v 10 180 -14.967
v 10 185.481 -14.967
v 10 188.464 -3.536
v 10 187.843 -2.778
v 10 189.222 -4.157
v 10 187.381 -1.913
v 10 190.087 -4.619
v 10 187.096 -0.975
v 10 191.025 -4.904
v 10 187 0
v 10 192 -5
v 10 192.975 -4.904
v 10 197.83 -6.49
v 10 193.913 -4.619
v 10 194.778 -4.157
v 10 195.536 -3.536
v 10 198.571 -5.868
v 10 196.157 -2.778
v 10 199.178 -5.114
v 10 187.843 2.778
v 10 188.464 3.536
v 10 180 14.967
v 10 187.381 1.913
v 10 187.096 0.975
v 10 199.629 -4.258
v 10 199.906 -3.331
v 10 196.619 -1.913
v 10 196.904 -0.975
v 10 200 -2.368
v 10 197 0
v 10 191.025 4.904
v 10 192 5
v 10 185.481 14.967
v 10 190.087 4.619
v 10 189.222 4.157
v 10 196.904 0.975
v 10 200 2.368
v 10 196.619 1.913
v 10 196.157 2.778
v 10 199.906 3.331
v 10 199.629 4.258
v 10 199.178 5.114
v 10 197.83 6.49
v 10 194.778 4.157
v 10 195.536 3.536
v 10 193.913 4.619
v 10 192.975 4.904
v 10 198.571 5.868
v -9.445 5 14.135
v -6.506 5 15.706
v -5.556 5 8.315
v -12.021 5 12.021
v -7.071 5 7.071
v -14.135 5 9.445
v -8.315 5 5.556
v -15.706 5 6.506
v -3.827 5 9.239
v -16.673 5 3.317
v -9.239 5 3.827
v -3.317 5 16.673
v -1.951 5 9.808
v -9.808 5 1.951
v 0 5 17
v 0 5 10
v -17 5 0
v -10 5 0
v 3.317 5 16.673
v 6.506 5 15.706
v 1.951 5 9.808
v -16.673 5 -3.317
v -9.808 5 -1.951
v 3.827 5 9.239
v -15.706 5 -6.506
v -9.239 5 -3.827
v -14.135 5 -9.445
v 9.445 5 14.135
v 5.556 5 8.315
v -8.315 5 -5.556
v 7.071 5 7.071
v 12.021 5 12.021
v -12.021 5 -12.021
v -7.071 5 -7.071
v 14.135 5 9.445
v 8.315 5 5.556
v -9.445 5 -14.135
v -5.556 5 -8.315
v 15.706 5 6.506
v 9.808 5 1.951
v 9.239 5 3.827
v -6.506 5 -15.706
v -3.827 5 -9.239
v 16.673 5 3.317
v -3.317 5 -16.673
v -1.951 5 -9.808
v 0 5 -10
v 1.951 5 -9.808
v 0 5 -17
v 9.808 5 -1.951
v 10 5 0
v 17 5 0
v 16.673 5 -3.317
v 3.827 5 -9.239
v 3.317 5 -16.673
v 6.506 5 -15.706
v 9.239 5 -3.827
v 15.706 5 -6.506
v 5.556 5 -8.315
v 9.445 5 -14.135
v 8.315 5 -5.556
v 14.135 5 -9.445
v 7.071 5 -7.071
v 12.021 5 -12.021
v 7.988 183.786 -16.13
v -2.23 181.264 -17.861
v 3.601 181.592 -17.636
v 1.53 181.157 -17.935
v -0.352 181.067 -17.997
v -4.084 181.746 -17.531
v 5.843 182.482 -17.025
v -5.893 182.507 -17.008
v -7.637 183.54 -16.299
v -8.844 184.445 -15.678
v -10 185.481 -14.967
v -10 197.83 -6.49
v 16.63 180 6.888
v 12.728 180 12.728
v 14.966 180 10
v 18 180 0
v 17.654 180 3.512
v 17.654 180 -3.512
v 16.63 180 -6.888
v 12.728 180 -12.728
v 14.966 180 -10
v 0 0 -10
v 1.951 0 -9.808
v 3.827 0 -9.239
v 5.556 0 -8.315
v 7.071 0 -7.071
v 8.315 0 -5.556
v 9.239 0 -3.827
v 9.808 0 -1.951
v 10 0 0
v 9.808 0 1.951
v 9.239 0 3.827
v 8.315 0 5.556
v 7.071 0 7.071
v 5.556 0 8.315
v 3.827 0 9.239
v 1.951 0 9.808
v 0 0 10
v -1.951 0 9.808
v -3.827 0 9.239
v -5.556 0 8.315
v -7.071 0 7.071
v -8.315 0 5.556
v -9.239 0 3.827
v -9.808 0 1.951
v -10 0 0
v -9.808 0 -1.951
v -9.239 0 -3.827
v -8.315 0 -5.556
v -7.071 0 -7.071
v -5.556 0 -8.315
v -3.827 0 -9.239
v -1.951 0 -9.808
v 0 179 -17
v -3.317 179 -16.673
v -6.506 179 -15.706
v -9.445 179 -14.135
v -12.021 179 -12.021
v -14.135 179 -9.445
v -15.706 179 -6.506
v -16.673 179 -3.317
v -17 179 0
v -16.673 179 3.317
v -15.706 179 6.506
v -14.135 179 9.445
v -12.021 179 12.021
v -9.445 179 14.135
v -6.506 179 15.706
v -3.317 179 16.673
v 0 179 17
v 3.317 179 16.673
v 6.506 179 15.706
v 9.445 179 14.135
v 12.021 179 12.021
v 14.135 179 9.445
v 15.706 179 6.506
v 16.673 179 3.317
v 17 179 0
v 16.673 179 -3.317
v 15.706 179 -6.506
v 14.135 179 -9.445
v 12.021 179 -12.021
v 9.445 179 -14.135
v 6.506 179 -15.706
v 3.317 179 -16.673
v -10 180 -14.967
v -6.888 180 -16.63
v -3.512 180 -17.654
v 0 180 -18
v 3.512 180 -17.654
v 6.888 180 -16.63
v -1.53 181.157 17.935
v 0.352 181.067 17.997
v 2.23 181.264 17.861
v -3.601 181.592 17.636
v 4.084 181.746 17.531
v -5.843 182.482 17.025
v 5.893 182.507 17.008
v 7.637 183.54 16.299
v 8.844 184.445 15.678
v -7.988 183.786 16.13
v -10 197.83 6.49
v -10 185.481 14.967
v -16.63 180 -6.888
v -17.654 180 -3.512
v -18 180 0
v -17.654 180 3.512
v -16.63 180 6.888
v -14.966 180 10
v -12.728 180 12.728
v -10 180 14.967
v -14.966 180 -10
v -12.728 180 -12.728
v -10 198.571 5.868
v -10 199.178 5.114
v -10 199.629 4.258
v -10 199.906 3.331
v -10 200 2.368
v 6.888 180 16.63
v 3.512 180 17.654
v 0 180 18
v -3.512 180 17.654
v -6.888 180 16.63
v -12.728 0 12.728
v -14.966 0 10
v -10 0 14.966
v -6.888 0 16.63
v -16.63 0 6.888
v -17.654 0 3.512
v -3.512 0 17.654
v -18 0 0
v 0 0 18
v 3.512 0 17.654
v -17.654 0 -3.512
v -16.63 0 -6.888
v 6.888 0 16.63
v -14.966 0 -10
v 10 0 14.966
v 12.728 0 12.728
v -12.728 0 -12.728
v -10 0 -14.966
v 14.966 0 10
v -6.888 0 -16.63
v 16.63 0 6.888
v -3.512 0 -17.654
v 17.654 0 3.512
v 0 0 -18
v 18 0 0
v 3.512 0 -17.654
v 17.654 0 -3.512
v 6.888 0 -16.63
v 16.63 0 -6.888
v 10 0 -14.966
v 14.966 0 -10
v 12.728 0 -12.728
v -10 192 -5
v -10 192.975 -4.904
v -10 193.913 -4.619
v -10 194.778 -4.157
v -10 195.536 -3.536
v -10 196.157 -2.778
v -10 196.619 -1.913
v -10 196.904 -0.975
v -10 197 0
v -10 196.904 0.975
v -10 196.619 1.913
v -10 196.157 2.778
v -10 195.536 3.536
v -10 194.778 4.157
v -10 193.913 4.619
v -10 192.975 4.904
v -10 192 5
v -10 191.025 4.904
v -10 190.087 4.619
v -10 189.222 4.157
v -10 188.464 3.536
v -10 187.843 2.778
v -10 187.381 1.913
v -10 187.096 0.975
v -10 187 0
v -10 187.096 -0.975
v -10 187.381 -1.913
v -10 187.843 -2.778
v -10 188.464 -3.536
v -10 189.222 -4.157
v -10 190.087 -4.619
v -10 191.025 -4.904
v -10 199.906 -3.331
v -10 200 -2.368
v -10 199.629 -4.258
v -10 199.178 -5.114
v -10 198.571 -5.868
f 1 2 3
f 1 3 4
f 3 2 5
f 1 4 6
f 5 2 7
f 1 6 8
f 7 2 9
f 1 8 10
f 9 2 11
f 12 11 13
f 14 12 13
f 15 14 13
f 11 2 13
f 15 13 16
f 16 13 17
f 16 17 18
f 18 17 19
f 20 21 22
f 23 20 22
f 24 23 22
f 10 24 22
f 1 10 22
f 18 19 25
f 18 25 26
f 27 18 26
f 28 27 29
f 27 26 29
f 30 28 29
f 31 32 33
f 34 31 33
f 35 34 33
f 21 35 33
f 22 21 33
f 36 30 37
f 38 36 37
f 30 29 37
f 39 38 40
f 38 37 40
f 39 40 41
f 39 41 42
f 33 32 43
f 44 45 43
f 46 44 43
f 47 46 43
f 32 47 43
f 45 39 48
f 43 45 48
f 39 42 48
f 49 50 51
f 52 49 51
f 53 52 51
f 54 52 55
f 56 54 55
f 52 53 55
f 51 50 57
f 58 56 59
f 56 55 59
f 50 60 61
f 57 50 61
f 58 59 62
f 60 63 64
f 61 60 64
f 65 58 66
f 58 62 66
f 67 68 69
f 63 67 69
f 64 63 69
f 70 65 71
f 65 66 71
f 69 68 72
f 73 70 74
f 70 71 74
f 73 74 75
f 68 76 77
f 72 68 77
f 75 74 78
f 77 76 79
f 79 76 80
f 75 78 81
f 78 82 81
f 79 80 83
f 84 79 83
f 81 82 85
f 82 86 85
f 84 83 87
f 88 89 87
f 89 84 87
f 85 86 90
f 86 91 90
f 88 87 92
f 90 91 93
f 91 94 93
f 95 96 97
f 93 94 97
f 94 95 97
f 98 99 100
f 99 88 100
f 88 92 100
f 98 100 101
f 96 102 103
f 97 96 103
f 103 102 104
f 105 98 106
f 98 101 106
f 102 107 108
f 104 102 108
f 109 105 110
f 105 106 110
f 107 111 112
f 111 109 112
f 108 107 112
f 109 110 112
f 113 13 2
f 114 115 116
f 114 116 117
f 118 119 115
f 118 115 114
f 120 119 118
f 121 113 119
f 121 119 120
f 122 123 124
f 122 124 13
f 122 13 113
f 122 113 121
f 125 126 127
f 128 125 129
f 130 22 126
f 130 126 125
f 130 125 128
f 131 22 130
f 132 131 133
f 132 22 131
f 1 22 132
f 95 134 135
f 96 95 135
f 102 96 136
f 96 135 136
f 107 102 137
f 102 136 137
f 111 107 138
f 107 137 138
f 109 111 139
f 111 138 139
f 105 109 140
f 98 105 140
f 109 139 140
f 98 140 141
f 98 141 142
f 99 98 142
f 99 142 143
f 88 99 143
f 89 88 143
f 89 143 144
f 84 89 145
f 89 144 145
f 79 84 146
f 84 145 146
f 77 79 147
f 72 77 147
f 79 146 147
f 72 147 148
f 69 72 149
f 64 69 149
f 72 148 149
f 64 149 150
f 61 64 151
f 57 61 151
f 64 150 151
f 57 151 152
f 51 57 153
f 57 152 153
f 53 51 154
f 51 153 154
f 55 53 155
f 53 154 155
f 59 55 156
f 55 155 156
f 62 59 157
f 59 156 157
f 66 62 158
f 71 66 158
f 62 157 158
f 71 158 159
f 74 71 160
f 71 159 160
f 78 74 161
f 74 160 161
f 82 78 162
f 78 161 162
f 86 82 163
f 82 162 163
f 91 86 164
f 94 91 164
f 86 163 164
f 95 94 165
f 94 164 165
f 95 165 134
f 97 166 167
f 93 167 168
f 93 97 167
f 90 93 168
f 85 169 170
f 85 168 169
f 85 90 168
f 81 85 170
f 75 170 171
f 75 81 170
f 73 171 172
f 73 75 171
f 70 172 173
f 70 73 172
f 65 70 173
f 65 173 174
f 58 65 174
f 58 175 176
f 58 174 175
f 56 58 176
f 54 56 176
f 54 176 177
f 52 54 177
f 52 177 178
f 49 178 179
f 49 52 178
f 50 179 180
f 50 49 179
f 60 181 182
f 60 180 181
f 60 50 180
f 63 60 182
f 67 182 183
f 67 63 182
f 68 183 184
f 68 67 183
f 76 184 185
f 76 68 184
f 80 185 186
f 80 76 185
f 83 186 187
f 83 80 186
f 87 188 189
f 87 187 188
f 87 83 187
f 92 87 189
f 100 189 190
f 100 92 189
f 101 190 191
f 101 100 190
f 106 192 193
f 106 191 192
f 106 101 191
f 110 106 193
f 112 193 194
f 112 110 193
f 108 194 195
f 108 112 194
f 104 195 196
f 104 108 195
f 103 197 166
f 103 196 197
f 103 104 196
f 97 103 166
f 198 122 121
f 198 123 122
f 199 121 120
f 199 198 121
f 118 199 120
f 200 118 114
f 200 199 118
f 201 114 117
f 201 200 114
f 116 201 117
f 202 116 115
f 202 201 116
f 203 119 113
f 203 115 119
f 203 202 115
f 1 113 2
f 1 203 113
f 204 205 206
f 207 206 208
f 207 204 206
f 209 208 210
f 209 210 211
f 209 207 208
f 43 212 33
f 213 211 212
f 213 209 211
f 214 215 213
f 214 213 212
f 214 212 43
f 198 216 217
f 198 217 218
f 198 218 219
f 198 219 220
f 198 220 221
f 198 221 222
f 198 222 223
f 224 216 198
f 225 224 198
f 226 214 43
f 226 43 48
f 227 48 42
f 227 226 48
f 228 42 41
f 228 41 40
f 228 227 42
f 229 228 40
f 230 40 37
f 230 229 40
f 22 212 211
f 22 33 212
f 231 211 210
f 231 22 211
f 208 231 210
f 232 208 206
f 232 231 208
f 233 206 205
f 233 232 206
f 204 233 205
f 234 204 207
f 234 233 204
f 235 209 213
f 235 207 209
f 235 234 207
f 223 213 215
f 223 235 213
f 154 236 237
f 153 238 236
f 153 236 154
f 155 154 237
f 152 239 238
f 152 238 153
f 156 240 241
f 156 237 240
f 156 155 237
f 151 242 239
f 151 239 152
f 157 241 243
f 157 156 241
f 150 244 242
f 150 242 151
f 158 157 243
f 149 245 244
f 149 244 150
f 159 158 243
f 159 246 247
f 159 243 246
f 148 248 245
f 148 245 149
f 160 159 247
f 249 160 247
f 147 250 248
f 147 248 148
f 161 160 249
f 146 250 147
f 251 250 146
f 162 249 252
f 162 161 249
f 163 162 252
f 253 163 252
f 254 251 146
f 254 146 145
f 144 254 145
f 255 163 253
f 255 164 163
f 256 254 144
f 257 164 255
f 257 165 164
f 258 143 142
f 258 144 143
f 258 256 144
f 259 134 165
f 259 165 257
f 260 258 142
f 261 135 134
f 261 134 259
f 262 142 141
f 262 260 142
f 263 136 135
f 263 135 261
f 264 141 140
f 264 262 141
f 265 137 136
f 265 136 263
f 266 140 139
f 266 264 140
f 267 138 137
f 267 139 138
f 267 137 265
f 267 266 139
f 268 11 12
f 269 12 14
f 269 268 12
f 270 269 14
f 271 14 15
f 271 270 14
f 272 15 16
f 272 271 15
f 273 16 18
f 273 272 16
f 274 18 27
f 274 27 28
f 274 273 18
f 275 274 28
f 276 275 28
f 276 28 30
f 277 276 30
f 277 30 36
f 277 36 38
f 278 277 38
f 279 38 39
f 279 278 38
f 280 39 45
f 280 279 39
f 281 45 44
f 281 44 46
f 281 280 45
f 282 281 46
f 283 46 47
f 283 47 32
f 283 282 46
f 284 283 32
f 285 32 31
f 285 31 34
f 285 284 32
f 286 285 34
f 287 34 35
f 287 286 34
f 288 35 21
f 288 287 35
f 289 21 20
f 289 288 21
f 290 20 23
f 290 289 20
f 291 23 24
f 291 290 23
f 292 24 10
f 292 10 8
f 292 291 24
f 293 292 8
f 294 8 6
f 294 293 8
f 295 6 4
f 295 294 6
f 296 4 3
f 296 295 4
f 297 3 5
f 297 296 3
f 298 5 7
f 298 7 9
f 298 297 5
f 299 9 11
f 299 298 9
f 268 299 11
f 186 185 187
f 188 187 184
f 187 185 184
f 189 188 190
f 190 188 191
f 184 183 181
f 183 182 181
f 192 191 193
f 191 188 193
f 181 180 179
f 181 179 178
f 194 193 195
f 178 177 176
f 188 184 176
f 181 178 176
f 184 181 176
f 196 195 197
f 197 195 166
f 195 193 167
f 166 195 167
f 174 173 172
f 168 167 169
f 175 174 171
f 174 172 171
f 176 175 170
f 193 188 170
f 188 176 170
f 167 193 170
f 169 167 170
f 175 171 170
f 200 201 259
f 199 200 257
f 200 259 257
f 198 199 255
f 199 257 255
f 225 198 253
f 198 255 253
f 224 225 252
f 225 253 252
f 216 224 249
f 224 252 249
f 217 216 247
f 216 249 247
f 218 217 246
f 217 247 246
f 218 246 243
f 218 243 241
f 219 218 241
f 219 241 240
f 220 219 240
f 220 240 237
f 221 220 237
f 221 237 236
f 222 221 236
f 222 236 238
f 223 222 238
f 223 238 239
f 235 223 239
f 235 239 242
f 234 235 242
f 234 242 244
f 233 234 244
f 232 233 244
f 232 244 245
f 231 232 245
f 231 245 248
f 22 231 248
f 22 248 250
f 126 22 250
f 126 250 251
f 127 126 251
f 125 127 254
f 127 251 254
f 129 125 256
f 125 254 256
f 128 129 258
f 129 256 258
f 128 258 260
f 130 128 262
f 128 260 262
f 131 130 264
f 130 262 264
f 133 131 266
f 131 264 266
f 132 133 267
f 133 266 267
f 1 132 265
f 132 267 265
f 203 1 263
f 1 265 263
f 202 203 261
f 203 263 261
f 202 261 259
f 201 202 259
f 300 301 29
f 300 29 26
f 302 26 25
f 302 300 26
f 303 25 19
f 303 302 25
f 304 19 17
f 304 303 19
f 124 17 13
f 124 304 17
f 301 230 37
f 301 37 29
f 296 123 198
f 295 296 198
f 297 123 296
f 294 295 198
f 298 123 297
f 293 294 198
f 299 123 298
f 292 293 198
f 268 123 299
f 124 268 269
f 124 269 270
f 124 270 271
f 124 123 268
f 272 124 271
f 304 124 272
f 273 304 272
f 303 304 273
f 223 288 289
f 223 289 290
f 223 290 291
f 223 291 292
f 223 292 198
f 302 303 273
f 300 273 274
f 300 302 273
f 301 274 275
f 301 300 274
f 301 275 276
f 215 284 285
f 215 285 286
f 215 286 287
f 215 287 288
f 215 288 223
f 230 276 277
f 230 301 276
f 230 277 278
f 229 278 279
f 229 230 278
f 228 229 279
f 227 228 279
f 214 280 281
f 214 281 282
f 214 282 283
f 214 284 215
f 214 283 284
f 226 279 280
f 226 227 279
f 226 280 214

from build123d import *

# Parameters (mm, degrees)
CROQUIS1_R                   = 18
SALIENTE_EXTRUIR1_DEPTH      = 180
VACIADO1_T                   = -1
CROQUIS3_R                   = 17
CROQUIS3_R_2                 = 10
SALIENTE_EXTRUIR2_DEPTH      = 5
SALIENTE_EXTRUIR3_DEPTH      = 10
SALIENTE_EXTRUIR3_DEPTH_BACK = 10
CROQUIS4_R                   = 5
CORTAR_EXTRUIR1_DEPTH        = 37


with BuildPart() as part:
    # Croquis1 → Saliente-Extruir1 (new body)
    with BuildSketch(Plane(origin=(0, 0, 0), x_dir=(1, 0, 0), z_dir=(0, 1, 0))):
        Circle(CROQUIS1_R)
    extrude(amount=SALIENTE_EXTRUIR1_DEPTH)

    # Vaciado1
    vaciado1_openings = [part.faces().sort_by_distance(p)[0] for p in [
        (0, 0, 0),
    ]]
    offset(amount=VACIADO1_T, openings=vaciado1_openings, kind=Kind.INTERSECTION)

    # Croquis3 → Saliente-Extruir2 (add)
    with BuildSketch(Plane.XZ):
        Circle(CROQUIS3_R)
        Circle(CROQUIS3_R_2, mode=Mode.SUBTRACT)
    extrude(amount=-SALIENTE_EXTRUIR2_DEPTH)

    # Croquis4 → Saliente-Extruir3 (add, two sides: drawn at the far end of the back side and taken through both)
    with BuildSketch(Plane(origin=(0, 0, 0), x_dir=(0, 0, -1), z_dir=(1, 0, 0)).offset(-SALIENTE_EXTRUIR3_DEPTH_BACK)):
        with BuildLine():
            Line((-2.367587924, 200), (2.367587924, 200))
            ThreePointArc((2.367587924, 200), (4.696897355, 199.424287239), (6.489801521, 197.82972703))
            Line((6.489801521, 197.82972703), (18.729162566, 180))
            Line((18.729162566, 180), (-18.729162566, 180))
            Line((-18.729162566, 180), (-6.489801521, 197.82972703))
            ThreePointArc((-6.489801521, 197.82972703), (-4.696897355, 199.424287239), (-2.367587924, 200))
        make_face()
        with Locations((0, 192)):
            Circle(CROQUIS4_R, mode=Mode.SUBTRACT)
    extrude(amount=SALIENTE_EXTRUIR3_DEPTH + SALIENTE_EXTRUIR3_DEPTH_BACK)

    # Croquis5 → Cortar-Extruir1 (cut)
    with BuildSketch(Plane(origin=(0, 180, 0), x_dir=(1, 0, 0), z_dir=(0, 1, 0))):
        with BuildLine():
            Line((34.507590677, -30.013991489), (34.507590677, -14.966629547))
            Line((34.507590677, -14.966629547), (10, -14.966629547))
            ThreePointArc((10, -14.966629547), (-18, 0), (10, 14.966629547))
            Line((10, 14.966629547), (10, 20.876886583))
            Line((10, 20.876886583), (-23.183234279, 20.876886583))
            Line((-23.183234279, 20.876886583), (-23.183234279, -30.013991489))
            Line((-23.183234279, -30.013991489), (34.507590677, -30.013991489))
        make_face()
    extrude(amount=CORTAR_EXTRUIR1_DEPTH, mode=Mode.SUBTRACT)


solid = part.part
